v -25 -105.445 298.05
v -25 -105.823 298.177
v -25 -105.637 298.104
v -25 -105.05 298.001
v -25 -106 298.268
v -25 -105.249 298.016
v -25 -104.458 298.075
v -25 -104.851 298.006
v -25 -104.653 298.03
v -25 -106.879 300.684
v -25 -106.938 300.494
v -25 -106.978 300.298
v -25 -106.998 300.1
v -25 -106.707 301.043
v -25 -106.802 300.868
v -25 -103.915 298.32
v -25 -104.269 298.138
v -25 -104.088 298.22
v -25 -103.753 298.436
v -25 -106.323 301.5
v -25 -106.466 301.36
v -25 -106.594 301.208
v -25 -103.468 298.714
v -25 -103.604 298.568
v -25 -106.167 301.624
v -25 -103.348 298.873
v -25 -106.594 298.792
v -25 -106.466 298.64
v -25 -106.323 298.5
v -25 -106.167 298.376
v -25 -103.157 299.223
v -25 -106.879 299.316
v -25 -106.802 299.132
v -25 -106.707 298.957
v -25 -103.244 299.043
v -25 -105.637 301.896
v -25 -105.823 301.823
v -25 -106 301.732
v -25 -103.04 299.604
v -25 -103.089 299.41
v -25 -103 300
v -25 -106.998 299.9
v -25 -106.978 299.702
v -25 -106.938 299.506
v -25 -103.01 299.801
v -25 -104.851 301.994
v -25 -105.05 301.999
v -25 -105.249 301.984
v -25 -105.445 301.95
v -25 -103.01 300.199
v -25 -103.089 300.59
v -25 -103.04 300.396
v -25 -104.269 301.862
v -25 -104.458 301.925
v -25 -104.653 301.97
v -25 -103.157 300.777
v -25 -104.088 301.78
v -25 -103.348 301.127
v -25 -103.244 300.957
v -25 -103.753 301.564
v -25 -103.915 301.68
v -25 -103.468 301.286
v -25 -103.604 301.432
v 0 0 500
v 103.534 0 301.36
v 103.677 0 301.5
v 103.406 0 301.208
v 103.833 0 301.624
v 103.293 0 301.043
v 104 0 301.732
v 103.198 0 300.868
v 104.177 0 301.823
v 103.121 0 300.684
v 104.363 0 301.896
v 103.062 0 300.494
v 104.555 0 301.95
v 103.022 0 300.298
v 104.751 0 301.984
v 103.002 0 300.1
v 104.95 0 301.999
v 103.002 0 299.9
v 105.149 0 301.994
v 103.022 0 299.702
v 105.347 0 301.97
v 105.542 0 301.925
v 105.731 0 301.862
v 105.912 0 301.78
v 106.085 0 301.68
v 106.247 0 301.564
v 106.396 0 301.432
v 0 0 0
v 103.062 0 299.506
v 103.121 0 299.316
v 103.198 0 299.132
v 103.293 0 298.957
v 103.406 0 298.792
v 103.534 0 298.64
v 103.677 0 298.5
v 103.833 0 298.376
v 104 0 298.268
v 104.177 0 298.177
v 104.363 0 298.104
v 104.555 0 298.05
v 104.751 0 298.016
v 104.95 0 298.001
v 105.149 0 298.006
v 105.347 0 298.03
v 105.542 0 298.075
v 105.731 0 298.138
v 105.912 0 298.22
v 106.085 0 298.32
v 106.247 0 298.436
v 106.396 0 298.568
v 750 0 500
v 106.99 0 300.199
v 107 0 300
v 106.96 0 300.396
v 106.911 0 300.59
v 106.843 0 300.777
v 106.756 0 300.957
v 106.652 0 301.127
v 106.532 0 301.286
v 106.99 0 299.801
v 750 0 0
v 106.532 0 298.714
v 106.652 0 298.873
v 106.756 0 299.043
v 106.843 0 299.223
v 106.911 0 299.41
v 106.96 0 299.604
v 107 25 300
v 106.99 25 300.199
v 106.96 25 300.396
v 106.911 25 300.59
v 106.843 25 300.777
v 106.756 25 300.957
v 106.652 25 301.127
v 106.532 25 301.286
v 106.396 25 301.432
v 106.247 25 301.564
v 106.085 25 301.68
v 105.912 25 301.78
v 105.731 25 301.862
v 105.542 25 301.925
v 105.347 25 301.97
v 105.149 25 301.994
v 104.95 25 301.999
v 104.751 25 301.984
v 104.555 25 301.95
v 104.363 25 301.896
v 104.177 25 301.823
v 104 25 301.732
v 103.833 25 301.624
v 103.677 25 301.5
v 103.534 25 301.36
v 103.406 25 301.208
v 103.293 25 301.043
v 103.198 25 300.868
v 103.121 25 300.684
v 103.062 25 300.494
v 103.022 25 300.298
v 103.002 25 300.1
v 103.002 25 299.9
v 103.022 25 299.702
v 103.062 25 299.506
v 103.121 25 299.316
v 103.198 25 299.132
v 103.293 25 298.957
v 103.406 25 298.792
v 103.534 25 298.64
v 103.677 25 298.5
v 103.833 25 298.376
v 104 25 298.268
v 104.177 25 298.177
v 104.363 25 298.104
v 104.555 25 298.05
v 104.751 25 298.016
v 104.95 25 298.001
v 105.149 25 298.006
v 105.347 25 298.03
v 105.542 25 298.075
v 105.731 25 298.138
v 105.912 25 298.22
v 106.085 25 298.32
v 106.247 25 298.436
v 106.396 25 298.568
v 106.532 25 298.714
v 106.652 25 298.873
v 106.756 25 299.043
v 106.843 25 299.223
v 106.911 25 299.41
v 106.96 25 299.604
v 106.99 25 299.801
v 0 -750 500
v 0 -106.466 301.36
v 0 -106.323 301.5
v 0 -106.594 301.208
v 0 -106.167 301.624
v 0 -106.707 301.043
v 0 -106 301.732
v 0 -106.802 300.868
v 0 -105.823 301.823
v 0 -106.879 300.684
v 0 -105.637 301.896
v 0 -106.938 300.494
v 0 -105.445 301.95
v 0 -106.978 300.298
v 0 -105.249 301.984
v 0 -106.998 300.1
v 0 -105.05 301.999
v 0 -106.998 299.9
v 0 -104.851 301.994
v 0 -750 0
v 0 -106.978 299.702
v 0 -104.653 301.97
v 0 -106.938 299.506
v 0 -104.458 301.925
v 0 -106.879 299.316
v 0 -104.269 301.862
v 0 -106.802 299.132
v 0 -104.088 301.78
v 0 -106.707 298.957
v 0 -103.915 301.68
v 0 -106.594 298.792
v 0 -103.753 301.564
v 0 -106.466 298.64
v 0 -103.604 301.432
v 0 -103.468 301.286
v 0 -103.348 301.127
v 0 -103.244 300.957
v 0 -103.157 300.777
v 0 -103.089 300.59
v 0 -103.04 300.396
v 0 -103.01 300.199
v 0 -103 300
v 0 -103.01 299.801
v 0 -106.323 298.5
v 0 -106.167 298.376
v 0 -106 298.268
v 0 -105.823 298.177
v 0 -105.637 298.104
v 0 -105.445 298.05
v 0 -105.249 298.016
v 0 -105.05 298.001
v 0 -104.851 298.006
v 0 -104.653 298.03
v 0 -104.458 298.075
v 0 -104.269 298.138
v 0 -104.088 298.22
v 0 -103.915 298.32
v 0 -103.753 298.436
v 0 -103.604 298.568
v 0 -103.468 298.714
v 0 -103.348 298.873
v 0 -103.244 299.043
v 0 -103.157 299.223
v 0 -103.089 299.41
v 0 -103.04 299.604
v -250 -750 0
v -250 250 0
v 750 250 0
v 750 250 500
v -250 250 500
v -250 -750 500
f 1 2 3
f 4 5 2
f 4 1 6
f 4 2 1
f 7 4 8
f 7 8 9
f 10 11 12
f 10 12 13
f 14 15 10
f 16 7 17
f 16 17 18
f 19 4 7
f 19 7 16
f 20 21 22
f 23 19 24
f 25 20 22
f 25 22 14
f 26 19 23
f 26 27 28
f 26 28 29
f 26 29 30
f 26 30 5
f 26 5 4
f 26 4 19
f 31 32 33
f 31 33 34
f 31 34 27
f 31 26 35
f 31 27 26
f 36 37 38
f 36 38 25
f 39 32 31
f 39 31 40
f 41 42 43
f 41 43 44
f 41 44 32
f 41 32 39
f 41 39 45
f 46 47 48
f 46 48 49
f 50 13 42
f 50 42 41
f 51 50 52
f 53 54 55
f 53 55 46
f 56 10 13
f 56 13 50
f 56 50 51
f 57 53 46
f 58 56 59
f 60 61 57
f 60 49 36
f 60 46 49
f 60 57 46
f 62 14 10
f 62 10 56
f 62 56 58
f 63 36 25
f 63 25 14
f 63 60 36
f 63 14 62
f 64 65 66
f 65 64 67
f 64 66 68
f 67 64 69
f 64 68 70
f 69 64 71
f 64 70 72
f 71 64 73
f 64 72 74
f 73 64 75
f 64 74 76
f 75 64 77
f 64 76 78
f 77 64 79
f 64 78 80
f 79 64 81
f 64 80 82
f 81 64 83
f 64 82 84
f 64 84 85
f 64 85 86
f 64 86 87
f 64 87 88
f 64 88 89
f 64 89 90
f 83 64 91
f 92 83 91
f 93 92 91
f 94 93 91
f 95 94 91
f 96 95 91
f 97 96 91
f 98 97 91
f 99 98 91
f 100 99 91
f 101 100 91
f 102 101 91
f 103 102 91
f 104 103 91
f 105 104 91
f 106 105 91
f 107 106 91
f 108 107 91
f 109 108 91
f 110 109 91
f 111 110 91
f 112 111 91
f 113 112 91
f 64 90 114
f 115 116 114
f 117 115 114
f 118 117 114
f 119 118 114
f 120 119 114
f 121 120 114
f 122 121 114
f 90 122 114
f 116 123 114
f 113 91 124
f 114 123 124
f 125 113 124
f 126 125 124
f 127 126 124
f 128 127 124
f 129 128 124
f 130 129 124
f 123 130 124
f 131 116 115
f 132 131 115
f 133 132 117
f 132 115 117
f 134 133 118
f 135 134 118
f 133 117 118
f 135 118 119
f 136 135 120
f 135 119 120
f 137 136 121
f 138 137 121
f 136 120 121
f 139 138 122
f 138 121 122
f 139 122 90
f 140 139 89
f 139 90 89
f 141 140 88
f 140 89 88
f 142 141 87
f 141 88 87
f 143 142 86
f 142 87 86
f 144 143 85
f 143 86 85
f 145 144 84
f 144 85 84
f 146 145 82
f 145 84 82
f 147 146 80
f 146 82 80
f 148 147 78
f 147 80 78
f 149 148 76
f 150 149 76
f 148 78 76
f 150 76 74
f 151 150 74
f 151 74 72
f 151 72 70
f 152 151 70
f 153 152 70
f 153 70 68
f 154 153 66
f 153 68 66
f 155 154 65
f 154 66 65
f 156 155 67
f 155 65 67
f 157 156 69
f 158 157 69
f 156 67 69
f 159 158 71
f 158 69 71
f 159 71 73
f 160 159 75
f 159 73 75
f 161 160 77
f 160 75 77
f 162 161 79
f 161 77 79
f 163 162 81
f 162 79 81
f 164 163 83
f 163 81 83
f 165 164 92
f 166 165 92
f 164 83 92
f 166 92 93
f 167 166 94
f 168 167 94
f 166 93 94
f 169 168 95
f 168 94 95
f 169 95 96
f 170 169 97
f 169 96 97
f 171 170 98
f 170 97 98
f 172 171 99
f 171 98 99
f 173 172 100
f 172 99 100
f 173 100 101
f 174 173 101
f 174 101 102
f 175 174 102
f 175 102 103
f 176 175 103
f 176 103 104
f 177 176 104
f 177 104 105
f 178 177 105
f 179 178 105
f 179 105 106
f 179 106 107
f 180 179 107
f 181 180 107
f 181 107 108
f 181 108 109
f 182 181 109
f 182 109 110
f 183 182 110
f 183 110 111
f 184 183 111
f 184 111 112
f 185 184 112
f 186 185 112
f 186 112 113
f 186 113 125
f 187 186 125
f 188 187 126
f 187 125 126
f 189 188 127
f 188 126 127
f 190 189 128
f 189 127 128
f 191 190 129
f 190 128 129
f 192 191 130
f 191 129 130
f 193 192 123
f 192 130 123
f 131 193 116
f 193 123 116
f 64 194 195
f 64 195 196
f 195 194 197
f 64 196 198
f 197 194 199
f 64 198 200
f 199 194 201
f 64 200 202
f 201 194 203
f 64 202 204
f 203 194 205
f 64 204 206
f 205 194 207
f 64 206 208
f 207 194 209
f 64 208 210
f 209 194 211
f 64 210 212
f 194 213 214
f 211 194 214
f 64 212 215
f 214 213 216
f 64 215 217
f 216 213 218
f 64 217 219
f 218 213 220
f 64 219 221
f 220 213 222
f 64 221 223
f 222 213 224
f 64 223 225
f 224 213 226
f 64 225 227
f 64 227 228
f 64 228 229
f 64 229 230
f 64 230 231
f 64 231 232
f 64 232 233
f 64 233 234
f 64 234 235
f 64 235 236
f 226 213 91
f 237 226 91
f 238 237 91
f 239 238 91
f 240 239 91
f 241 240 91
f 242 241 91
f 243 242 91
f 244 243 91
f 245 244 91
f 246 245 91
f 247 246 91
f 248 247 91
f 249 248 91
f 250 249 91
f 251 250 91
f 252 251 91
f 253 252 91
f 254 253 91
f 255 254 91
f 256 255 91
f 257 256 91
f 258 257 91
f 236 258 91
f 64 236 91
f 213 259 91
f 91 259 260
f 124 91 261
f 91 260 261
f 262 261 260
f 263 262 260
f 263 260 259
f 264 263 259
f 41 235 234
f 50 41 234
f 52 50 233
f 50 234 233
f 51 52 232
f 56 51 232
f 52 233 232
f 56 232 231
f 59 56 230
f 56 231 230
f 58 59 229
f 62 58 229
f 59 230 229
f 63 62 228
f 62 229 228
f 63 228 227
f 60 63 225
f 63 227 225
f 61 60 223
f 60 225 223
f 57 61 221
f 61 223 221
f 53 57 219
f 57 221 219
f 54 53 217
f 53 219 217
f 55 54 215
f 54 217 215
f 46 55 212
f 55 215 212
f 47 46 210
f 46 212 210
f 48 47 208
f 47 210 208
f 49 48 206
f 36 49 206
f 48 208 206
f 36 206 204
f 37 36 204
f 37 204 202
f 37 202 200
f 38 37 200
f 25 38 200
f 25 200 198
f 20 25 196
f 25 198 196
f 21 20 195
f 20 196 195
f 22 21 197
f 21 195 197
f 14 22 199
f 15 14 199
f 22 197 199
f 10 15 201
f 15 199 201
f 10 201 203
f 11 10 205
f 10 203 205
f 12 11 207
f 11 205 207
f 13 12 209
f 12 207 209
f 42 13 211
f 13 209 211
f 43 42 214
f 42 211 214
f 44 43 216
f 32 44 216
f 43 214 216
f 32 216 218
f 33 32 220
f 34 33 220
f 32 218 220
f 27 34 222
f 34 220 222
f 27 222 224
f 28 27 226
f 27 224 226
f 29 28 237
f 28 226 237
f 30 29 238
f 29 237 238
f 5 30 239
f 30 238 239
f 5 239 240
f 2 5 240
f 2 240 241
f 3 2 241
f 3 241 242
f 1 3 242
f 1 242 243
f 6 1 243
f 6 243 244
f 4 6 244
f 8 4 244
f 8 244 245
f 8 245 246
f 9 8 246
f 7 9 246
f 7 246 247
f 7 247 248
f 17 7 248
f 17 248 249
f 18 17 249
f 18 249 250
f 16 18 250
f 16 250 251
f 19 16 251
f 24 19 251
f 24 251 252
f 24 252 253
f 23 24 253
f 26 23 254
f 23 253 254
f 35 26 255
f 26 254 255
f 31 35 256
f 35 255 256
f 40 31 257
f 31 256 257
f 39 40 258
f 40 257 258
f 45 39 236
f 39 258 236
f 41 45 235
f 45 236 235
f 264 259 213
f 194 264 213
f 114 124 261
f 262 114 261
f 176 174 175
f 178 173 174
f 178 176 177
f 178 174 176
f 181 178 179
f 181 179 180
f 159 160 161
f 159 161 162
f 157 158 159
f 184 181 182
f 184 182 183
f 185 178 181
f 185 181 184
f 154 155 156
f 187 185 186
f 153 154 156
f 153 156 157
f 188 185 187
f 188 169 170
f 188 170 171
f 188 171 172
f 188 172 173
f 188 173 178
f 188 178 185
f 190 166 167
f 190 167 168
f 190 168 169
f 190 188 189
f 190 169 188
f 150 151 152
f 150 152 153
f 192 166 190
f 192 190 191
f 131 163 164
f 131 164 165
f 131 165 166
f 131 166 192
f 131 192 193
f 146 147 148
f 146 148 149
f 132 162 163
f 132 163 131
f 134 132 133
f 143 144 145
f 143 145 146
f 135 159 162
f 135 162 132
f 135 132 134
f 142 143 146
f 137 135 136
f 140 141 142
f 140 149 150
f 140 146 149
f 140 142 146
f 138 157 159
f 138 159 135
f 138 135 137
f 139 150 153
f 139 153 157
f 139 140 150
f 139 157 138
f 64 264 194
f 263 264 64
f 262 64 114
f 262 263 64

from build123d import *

# Parameters (mm, degrees)
F0_W     = 250
F0_H     = 750
F1_DEPTH = 500
F2_R     = 2
F3_DEPTH = 25
F4_R     = 2
F5_DEPTH = 25


with BuildPart() as f1:
    # F0 (on Top) → F1 (new body)
    with BuildSketch(Plane.XY):
        with Locations((-125, -375)):
            Rectangle(F0_W, F0_H)
        Polygon((-250, 0), (0, 0), (750, 0), (750, 250), (-250, 250), align=None)
    extrude(amount=F1_DEPTH)

    # F2 (on face) → F3 (cut)
    with BuildSketch(Plane.YZ):
        with Locations((-105, 300)):
            Circle(F2_R)
    extrude(amount=-F3_DEPTH, mode=Mode.SUBTRACT)

    # F4 (on face) → F5 (cut)
    with BuildSketch(Plane.XZ):
        with Locations((105, 300)):
            Circle(F4_R)
    extrude(amount=-F5_DEPTH, mode=Mode.SUBTRACT)


solid = f1.part
